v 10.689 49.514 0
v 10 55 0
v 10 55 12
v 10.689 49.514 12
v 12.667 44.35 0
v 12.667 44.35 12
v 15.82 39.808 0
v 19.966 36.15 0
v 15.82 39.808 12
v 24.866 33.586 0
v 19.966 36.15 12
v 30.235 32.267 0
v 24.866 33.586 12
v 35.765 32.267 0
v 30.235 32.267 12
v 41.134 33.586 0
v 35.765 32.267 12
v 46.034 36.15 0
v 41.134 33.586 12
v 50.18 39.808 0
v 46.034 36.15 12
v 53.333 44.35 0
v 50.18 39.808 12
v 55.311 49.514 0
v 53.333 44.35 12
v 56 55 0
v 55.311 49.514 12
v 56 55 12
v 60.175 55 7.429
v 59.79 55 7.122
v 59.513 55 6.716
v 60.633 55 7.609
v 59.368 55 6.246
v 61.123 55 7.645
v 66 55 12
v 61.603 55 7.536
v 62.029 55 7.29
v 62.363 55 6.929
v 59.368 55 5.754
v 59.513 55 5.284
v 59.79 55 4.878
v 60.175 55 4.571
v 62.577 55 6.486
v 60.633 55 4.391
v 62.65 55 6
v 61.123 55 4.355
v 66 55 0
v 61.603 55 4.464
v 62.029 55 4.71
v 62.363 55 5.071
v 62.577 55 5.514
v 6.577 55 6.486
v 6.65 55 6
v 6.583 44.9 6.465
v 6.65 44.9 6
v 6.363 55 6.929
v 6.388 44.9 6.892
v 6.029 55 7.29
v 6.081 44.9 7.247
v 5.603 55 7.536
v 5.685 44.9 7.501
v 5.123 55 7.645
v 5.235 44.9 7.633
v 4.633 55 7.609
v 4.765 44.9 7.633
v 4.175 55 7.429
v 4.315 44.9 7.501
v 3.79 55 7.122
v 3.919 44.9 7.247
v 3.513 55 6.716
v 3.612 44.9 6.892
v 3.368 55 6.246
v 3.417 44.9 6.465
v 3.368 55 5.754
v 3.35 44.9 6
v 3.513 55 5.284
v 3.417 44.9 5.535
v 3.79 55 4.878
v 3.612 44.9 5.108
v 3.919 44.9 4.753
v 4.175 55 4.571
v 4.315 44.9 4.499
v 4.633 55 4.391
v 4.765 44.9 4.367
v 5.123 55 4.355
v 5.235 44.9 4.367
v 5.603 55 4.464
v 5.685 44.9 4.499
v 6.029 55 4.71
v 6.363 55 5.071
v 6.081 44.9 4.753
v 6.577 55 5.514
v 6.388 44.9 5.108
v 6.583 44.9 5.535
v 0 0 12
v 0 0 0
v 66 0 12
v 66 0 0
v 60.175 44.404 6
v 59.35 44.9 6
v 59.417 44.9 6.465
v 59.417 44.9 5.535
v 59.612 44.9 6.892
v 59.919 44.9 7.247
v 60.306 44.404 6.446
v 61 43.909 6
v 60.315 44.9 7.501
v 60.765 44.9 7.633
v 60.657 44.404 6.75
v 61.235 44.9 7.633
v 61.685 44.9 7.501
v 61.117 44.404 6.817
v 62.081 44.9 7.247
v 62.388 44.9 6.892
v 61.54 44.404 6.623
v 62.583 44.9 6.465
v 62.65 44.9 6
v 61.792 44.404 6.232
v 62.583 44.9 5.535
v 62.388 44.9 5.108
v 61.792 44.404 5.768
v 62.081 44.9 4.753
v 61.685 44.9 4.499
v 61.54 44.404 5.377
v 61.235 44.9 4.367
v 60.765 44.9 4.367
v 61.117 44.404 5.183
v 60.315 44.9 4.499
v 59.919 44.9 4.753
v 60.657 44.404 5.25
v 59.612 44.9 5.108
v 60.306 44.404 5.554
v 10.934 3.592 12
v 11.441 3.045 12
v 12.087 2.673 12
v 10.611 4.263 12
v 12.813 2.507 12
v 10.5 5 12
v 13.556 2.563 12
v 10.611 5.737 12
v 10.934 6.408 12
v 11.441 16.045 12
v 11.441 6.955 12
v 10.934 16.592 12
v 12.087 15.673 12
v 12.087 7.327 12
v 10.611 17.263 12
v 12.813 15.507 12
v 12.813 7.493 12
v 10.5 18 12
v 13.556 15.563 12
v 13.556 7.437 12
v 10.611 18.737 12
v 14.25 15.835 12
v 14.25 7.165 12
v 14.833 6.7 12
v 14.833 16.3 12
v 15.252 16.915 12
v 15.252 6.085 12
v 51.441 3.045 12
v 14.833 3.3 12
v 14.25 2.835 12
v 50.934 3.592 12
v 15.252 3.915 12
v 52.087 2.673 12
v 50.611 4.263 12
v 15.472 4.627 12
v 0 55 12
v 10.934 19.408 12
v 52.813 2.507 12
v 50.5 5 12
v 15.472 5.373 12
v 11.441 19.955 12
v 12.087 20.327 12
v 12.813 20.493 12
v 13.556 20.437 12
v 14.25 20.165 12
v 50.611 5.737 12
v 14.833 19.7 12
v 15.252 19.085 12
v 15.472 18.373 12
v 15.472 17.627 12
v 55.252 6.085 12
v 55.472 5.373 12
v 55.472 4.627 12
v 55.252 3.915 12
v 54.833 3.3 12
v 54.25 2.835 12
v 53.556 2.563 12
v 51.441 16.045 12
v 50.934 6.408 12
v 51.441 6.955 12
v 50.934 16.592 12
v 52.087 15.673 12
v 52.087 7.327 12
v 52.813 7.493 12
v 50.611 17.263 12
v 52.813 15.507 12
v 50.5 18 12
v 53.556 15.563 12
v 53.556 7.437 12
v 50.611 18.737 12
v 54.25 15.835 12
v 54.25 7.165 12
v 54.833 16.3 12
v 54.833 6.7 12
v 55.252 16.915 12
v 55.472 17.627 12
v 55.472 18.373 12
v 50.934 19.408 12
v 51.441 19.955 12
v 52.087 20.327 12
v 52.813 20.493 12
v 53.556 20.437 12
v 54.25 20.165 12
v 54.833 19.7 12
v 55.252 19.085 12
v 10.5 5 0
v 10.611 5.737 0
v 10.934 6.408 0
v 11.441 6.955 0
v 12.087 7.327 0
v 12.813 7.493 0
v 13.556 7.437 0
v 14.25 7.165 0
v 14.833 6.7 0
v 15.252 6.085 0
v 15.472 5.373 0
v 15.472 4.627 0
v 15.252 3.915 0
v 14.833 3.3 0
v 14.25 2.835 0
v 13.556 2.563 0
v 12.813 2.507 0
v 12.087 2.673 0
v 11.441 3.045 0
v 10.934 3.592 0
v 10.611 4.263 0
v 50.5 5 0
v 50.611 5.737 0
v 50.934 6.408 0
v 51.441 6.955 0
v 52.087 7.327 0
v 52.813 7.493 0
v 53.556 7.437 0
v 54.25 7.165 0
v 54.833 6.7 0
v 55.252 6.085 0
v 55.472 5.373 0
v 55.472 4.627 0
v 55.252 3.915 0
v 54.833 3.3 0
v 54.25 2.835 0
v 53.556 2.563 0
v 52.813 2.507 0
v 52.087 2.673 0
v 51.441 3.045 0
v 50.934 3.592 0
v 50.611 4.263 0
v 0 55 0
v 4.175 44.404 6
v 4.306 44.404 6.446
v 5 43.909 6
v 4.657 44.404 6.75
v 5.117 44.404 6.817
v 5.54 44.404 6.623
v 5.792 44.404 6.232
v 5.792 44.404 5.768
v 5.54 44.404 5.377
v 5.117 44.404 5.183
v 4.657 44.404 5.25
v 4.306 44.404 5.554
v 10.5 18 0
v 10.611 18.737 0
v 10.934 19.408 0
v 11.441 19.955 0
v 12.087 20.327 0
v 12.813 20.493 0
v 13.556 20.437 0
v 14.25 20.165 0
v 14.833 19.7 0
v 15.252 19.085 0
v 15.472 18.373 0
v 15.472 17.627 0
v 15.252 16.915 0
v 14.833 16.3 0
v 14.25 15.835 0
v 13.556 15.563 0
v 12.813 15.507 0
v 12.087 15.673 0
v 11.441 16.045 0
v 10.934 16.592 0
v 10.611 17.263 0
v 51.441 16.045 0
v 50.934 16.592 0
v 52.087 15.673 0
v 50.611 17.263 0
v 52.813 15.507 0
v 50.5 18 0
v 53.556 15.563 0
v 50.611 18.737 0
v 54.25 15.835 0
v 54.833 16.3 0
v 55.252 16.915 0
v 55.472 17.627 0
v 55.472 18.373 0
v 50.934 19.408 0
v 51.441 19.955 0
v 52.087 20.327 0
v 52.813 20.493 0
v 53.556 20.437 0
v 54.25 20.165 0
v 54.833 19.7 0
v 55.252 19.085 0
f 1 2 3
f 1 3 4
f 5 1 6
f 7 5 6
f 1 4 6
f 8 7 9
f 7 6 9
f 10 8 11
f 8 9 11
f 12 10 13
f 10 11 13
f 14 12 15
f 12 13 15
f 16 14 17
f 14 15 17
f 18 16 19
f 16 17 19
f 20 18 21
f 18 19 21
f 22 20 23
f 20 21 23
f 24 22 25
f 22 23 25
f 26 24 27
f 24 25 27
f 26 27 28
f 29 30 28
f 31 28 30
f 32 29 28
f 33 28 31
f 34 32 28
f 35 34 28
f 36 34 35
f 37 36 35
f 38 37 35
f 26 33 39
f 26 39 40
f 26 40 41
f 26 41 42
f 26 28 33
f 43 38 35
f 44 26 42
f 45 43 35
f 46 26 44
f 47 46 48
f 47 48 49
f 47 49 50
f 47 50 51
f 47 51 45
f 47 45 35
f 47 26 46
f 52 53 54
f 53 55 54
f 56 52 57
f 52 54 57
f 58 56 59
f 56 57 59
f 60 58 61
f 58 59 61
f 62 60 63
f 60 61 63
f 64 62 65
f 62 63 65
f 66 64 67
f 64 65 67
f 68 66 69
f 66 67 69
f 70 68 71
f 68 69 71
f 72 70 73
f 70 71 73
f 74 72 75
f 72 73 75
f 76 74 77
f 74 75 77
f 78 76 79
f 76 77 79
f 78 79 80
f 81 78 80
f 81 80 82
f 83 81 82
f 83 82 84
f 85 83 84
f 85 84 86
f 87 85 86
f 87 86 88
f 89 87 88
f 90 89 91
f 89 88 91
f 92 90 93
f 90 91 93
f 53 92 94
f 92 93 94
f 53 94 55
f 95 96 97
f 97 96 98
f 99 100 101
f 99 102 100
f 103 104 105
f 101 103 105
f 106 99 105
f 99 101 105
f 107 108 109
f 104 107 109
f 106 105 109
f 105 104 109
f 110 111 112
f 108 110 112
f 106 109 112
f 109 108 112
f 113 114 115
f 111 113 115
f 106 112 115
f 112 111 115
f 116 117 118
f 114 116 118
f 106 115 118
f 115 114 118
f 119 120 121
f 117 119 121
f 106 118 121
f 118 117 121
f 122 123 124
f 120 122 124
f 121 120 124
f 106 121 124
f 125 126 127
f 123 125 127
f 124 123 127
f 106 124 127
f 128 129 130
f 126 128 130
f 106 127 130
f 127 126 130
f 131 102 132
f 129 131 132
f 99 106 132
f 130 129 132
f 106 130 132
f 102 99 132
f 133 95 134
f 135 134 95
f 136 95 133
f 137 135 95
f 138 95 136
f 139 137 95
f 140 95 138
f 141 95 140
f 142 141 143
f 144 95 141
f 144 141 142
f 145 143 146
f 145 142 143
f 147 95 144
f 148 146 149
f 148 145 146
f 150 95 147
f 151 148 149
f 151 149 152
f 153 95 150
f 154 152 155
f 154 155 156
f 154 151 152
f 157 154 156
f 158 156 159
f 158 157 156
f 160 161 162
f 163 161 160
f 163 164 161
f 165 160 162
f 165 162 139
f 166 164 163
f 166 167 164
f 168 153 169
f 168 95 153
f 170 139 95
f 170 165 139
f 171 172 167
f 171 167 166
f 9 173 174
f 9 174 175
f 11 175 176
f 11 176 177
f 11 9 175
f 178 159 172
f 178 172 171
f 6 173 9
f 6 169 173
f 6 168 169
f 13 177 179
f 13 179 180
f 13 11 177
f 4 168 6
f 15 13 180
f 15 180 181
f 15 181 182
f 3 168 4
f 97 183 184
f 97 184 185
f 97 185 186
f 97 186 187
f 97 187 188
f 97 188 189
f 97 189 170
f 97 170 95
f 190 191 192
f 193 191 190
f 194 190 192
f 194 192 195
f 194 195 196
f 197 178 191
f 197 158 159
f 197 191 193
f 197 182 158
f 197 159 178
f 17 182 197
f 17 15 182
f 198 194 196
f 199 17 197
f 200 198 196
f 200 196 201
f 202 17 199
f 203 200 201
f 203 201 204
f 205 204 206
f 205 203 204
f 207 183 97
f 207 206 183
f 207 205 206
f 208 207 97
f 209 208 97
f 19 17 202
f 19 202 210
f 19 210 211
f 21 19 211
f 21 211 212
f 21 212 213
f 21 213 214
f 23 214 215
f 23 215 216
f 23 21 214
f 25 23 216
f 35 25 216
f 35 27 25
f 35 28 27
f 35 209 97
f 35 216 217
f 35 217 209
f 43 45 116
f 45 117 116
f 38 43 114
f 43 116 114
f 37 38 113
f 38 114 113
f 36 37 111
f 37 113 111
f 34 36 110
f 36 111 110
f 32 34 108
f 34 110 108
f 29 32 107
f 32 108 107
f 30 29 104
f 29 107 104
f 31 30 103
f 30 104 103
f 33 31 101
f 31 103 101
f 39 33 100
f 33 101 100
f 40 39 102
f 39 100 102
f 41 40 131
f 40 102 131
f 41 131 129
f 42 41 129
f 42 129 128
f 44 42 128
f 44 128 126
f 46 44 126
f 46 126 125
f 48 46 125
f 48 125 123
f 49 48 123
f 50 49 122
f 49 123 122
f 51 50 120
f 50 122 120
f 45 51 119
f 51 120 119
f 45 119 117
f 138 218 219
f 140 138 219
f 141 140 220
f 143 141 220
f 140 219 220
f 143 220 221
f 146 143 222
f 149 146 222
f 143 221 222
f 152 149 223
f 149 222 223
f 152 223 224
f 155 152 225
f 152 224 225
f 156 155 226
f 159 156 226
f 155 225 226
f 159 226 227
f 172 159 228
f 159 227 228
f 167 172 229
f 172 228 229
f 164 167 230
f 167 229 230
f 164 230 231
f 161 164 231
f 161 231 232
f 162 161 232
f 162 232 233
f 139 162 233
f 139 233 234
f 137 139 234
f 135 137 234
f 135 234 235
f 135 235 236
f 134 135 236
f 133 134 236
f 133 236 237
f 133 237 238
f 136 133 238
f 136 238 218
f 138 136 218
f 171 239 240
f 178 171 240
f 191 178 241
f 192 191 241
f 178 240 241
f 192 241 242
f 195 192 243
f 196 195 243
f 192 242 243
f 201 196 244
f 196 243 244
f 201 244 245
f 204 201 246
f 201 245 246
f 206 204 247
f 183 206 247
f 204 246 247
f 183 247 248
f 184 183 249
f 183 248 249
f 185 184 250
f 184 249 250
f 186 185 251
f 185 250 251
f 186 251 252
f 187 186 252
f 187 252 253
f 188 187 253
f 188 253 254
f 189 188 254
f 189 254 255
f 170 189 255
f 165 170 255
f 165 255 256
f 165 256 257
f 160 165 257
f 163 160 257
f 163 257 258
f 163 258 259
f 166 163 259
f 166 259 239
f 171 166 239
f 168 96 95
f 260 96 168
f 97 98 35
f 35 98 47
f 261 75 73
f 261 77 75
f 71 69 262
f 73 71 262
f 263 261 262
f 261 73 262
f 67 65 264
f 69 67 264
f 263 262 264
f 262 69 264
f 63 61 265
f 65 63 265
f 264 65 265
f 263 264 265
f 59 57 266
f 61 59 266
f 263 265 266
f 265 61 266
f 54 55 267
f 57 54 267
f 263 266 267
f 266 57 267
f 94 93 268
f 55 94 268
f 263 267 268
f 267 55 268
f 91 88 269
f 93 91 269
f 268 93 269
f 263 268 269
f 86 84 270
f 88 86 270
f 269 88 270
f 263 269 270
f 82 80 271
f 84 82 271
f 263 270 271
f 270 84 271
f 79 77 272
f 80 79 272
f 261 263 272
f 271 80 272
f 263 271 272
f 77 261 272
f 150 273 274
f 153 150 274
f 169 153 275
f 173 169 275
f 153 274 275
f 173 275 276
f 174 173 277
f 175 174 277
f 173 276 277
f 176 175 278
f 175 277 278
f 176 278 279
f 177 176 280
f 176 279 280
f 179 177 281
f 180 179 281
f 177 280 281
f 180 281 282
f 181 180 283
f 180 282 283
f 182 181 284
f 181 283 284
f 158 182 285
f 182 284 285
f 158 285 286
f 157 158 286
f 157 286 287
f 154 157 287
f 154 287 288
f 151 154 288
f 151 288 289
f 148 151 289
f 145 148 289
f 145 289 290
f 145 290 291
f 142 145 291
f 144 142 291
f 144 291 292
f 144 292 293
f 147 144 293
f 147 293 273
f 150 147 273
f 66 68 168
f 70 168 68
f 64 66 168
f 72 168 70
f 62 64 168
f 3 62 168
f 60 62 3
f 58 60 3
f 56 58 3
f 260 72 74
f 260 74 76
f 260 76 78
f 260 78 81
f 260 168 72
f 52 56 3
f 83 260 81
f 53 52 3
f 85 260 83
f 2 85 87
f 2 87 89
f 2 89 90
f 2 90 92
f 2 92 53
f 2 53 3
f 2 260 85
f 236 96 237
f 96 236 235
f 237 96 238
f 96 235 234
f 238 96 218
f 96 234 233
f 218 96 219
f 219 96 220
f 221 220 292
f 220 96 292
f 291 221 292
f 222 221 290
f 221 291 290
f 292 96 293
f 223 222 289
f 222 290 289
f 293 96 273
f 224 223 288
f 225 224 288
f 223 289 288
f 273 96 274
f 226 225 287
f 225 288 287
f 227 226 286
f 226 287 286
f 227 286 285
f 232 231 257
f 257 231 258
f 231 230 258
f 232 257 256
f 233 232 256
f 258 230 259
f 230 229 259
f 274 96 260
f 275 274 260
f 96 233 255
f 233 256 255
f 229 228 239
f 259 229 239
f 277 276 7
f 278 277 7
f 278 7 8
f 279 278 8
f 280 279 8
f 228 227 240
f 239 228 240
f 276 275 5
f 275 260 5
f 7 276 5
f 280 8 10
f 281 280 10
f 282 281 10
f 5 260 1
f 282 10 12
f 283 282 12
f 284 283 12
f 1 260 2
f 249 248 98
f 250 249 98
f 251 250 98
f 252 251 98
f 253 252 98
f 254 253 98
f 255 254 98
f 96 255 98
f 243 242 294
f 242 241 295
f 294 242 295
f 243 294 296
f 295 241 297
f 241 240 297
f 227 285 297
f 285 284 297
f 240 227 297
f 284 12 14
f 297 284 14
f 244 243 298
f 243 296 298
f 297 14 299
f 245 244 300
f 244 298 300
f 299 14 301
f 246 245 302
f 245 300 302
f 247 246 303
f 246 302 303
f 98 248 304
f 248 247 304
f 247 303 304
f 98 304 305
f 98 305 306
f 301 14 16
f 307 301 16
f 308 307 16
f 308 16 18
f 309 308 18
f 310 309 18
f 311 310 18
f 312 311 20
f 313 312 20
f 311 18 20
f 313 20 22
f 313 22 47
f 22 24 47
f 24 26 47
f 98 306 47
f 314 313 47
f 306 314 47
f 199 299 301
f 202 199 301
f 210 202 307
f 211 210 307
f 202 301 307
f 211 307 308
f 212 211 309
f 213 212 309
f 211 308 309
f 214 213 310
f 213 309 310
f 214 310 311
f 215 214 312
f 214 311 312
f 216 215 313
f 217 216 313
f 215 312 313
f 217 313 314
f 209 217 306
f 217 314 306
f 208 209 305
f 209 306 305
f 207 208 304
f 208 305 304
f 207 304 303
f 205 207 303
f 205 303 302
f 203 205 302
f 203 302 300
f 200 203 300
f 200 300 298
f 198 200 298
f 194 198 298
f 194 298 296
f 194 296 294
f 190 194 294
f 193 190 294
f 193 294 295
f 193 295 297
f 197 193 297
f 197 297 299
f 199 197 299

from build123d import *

# Parameters (mm, degrees)
SKETCH_1_W             = 66
SKETCH_1_H             = 55
EXTRUDE_1_DEPTH        = 12
SKETCH_2_R             = 23
CUT_EXTRUDE_1_DEPTH    = 87.746757864
HOLE_WIZARD_M6_1_D     = 5
HOLE_WIZARD_M4_1_D     = 3.3
HOLE_WIZARD_M4_1_DEPTH = 10.1
HOLE_WIZARD_M4_1_TIP   = 0.991420021


with BuildPart() as part:
    # 草图1 → 凸台-拉伸1 (new body)
    with BuildSketch(Plane.XY):
        with Locations((33, 27.5)):
            Rectangle(SKETCH_1_W, SKETCH_1_H)
    extrude(amount=EXTRUDE_1_DEPTH)

    # 草图2 → 切除-拉伸1 (cut, through all)
    with BuildSketch(Plane.XY.offset(12)):
        with Locations((33, 55.1)):
            Circle(SKETCH_2_R)
    extrude(amount=-CUT_EXTRUDE_1_DEPTH, mode=Mode.SUBTRACT)

    # M6 螺纹孔1 (through all)
    with Locations(Plane.XY.offset(12)):
        with Locations((13, 18), (53, 18), (13, 5), (53, 5)):
            Hole(HOLE_WIZARD_M6_1_D / 2)

    # M4 螺纹孔1
    with Locations(Plane(origin=(0, 55, 0), x_dir=(-1, 0, 0), z_dir=(0, 1, 0))):
        with Locations((-5, 6), (-61, 6)):
            Hole(HOLE_WIZARD_M4_1_D / 2, depth=HOLE_WIZARD_M4_1_DEPTH)
            with Locations((0, 0, -(HOLE_WIZARD_M4_1_DEPTH + HOLE_WIZARD_M4_1_TIP / 2))):  # 118° drill point
                Cone(0, HOLE_WIZARD_M4_1_D / 2, HOLE_WIZARD_M4_1_TIP, mode=Mode.SUBTRACT)


solid = part.part
